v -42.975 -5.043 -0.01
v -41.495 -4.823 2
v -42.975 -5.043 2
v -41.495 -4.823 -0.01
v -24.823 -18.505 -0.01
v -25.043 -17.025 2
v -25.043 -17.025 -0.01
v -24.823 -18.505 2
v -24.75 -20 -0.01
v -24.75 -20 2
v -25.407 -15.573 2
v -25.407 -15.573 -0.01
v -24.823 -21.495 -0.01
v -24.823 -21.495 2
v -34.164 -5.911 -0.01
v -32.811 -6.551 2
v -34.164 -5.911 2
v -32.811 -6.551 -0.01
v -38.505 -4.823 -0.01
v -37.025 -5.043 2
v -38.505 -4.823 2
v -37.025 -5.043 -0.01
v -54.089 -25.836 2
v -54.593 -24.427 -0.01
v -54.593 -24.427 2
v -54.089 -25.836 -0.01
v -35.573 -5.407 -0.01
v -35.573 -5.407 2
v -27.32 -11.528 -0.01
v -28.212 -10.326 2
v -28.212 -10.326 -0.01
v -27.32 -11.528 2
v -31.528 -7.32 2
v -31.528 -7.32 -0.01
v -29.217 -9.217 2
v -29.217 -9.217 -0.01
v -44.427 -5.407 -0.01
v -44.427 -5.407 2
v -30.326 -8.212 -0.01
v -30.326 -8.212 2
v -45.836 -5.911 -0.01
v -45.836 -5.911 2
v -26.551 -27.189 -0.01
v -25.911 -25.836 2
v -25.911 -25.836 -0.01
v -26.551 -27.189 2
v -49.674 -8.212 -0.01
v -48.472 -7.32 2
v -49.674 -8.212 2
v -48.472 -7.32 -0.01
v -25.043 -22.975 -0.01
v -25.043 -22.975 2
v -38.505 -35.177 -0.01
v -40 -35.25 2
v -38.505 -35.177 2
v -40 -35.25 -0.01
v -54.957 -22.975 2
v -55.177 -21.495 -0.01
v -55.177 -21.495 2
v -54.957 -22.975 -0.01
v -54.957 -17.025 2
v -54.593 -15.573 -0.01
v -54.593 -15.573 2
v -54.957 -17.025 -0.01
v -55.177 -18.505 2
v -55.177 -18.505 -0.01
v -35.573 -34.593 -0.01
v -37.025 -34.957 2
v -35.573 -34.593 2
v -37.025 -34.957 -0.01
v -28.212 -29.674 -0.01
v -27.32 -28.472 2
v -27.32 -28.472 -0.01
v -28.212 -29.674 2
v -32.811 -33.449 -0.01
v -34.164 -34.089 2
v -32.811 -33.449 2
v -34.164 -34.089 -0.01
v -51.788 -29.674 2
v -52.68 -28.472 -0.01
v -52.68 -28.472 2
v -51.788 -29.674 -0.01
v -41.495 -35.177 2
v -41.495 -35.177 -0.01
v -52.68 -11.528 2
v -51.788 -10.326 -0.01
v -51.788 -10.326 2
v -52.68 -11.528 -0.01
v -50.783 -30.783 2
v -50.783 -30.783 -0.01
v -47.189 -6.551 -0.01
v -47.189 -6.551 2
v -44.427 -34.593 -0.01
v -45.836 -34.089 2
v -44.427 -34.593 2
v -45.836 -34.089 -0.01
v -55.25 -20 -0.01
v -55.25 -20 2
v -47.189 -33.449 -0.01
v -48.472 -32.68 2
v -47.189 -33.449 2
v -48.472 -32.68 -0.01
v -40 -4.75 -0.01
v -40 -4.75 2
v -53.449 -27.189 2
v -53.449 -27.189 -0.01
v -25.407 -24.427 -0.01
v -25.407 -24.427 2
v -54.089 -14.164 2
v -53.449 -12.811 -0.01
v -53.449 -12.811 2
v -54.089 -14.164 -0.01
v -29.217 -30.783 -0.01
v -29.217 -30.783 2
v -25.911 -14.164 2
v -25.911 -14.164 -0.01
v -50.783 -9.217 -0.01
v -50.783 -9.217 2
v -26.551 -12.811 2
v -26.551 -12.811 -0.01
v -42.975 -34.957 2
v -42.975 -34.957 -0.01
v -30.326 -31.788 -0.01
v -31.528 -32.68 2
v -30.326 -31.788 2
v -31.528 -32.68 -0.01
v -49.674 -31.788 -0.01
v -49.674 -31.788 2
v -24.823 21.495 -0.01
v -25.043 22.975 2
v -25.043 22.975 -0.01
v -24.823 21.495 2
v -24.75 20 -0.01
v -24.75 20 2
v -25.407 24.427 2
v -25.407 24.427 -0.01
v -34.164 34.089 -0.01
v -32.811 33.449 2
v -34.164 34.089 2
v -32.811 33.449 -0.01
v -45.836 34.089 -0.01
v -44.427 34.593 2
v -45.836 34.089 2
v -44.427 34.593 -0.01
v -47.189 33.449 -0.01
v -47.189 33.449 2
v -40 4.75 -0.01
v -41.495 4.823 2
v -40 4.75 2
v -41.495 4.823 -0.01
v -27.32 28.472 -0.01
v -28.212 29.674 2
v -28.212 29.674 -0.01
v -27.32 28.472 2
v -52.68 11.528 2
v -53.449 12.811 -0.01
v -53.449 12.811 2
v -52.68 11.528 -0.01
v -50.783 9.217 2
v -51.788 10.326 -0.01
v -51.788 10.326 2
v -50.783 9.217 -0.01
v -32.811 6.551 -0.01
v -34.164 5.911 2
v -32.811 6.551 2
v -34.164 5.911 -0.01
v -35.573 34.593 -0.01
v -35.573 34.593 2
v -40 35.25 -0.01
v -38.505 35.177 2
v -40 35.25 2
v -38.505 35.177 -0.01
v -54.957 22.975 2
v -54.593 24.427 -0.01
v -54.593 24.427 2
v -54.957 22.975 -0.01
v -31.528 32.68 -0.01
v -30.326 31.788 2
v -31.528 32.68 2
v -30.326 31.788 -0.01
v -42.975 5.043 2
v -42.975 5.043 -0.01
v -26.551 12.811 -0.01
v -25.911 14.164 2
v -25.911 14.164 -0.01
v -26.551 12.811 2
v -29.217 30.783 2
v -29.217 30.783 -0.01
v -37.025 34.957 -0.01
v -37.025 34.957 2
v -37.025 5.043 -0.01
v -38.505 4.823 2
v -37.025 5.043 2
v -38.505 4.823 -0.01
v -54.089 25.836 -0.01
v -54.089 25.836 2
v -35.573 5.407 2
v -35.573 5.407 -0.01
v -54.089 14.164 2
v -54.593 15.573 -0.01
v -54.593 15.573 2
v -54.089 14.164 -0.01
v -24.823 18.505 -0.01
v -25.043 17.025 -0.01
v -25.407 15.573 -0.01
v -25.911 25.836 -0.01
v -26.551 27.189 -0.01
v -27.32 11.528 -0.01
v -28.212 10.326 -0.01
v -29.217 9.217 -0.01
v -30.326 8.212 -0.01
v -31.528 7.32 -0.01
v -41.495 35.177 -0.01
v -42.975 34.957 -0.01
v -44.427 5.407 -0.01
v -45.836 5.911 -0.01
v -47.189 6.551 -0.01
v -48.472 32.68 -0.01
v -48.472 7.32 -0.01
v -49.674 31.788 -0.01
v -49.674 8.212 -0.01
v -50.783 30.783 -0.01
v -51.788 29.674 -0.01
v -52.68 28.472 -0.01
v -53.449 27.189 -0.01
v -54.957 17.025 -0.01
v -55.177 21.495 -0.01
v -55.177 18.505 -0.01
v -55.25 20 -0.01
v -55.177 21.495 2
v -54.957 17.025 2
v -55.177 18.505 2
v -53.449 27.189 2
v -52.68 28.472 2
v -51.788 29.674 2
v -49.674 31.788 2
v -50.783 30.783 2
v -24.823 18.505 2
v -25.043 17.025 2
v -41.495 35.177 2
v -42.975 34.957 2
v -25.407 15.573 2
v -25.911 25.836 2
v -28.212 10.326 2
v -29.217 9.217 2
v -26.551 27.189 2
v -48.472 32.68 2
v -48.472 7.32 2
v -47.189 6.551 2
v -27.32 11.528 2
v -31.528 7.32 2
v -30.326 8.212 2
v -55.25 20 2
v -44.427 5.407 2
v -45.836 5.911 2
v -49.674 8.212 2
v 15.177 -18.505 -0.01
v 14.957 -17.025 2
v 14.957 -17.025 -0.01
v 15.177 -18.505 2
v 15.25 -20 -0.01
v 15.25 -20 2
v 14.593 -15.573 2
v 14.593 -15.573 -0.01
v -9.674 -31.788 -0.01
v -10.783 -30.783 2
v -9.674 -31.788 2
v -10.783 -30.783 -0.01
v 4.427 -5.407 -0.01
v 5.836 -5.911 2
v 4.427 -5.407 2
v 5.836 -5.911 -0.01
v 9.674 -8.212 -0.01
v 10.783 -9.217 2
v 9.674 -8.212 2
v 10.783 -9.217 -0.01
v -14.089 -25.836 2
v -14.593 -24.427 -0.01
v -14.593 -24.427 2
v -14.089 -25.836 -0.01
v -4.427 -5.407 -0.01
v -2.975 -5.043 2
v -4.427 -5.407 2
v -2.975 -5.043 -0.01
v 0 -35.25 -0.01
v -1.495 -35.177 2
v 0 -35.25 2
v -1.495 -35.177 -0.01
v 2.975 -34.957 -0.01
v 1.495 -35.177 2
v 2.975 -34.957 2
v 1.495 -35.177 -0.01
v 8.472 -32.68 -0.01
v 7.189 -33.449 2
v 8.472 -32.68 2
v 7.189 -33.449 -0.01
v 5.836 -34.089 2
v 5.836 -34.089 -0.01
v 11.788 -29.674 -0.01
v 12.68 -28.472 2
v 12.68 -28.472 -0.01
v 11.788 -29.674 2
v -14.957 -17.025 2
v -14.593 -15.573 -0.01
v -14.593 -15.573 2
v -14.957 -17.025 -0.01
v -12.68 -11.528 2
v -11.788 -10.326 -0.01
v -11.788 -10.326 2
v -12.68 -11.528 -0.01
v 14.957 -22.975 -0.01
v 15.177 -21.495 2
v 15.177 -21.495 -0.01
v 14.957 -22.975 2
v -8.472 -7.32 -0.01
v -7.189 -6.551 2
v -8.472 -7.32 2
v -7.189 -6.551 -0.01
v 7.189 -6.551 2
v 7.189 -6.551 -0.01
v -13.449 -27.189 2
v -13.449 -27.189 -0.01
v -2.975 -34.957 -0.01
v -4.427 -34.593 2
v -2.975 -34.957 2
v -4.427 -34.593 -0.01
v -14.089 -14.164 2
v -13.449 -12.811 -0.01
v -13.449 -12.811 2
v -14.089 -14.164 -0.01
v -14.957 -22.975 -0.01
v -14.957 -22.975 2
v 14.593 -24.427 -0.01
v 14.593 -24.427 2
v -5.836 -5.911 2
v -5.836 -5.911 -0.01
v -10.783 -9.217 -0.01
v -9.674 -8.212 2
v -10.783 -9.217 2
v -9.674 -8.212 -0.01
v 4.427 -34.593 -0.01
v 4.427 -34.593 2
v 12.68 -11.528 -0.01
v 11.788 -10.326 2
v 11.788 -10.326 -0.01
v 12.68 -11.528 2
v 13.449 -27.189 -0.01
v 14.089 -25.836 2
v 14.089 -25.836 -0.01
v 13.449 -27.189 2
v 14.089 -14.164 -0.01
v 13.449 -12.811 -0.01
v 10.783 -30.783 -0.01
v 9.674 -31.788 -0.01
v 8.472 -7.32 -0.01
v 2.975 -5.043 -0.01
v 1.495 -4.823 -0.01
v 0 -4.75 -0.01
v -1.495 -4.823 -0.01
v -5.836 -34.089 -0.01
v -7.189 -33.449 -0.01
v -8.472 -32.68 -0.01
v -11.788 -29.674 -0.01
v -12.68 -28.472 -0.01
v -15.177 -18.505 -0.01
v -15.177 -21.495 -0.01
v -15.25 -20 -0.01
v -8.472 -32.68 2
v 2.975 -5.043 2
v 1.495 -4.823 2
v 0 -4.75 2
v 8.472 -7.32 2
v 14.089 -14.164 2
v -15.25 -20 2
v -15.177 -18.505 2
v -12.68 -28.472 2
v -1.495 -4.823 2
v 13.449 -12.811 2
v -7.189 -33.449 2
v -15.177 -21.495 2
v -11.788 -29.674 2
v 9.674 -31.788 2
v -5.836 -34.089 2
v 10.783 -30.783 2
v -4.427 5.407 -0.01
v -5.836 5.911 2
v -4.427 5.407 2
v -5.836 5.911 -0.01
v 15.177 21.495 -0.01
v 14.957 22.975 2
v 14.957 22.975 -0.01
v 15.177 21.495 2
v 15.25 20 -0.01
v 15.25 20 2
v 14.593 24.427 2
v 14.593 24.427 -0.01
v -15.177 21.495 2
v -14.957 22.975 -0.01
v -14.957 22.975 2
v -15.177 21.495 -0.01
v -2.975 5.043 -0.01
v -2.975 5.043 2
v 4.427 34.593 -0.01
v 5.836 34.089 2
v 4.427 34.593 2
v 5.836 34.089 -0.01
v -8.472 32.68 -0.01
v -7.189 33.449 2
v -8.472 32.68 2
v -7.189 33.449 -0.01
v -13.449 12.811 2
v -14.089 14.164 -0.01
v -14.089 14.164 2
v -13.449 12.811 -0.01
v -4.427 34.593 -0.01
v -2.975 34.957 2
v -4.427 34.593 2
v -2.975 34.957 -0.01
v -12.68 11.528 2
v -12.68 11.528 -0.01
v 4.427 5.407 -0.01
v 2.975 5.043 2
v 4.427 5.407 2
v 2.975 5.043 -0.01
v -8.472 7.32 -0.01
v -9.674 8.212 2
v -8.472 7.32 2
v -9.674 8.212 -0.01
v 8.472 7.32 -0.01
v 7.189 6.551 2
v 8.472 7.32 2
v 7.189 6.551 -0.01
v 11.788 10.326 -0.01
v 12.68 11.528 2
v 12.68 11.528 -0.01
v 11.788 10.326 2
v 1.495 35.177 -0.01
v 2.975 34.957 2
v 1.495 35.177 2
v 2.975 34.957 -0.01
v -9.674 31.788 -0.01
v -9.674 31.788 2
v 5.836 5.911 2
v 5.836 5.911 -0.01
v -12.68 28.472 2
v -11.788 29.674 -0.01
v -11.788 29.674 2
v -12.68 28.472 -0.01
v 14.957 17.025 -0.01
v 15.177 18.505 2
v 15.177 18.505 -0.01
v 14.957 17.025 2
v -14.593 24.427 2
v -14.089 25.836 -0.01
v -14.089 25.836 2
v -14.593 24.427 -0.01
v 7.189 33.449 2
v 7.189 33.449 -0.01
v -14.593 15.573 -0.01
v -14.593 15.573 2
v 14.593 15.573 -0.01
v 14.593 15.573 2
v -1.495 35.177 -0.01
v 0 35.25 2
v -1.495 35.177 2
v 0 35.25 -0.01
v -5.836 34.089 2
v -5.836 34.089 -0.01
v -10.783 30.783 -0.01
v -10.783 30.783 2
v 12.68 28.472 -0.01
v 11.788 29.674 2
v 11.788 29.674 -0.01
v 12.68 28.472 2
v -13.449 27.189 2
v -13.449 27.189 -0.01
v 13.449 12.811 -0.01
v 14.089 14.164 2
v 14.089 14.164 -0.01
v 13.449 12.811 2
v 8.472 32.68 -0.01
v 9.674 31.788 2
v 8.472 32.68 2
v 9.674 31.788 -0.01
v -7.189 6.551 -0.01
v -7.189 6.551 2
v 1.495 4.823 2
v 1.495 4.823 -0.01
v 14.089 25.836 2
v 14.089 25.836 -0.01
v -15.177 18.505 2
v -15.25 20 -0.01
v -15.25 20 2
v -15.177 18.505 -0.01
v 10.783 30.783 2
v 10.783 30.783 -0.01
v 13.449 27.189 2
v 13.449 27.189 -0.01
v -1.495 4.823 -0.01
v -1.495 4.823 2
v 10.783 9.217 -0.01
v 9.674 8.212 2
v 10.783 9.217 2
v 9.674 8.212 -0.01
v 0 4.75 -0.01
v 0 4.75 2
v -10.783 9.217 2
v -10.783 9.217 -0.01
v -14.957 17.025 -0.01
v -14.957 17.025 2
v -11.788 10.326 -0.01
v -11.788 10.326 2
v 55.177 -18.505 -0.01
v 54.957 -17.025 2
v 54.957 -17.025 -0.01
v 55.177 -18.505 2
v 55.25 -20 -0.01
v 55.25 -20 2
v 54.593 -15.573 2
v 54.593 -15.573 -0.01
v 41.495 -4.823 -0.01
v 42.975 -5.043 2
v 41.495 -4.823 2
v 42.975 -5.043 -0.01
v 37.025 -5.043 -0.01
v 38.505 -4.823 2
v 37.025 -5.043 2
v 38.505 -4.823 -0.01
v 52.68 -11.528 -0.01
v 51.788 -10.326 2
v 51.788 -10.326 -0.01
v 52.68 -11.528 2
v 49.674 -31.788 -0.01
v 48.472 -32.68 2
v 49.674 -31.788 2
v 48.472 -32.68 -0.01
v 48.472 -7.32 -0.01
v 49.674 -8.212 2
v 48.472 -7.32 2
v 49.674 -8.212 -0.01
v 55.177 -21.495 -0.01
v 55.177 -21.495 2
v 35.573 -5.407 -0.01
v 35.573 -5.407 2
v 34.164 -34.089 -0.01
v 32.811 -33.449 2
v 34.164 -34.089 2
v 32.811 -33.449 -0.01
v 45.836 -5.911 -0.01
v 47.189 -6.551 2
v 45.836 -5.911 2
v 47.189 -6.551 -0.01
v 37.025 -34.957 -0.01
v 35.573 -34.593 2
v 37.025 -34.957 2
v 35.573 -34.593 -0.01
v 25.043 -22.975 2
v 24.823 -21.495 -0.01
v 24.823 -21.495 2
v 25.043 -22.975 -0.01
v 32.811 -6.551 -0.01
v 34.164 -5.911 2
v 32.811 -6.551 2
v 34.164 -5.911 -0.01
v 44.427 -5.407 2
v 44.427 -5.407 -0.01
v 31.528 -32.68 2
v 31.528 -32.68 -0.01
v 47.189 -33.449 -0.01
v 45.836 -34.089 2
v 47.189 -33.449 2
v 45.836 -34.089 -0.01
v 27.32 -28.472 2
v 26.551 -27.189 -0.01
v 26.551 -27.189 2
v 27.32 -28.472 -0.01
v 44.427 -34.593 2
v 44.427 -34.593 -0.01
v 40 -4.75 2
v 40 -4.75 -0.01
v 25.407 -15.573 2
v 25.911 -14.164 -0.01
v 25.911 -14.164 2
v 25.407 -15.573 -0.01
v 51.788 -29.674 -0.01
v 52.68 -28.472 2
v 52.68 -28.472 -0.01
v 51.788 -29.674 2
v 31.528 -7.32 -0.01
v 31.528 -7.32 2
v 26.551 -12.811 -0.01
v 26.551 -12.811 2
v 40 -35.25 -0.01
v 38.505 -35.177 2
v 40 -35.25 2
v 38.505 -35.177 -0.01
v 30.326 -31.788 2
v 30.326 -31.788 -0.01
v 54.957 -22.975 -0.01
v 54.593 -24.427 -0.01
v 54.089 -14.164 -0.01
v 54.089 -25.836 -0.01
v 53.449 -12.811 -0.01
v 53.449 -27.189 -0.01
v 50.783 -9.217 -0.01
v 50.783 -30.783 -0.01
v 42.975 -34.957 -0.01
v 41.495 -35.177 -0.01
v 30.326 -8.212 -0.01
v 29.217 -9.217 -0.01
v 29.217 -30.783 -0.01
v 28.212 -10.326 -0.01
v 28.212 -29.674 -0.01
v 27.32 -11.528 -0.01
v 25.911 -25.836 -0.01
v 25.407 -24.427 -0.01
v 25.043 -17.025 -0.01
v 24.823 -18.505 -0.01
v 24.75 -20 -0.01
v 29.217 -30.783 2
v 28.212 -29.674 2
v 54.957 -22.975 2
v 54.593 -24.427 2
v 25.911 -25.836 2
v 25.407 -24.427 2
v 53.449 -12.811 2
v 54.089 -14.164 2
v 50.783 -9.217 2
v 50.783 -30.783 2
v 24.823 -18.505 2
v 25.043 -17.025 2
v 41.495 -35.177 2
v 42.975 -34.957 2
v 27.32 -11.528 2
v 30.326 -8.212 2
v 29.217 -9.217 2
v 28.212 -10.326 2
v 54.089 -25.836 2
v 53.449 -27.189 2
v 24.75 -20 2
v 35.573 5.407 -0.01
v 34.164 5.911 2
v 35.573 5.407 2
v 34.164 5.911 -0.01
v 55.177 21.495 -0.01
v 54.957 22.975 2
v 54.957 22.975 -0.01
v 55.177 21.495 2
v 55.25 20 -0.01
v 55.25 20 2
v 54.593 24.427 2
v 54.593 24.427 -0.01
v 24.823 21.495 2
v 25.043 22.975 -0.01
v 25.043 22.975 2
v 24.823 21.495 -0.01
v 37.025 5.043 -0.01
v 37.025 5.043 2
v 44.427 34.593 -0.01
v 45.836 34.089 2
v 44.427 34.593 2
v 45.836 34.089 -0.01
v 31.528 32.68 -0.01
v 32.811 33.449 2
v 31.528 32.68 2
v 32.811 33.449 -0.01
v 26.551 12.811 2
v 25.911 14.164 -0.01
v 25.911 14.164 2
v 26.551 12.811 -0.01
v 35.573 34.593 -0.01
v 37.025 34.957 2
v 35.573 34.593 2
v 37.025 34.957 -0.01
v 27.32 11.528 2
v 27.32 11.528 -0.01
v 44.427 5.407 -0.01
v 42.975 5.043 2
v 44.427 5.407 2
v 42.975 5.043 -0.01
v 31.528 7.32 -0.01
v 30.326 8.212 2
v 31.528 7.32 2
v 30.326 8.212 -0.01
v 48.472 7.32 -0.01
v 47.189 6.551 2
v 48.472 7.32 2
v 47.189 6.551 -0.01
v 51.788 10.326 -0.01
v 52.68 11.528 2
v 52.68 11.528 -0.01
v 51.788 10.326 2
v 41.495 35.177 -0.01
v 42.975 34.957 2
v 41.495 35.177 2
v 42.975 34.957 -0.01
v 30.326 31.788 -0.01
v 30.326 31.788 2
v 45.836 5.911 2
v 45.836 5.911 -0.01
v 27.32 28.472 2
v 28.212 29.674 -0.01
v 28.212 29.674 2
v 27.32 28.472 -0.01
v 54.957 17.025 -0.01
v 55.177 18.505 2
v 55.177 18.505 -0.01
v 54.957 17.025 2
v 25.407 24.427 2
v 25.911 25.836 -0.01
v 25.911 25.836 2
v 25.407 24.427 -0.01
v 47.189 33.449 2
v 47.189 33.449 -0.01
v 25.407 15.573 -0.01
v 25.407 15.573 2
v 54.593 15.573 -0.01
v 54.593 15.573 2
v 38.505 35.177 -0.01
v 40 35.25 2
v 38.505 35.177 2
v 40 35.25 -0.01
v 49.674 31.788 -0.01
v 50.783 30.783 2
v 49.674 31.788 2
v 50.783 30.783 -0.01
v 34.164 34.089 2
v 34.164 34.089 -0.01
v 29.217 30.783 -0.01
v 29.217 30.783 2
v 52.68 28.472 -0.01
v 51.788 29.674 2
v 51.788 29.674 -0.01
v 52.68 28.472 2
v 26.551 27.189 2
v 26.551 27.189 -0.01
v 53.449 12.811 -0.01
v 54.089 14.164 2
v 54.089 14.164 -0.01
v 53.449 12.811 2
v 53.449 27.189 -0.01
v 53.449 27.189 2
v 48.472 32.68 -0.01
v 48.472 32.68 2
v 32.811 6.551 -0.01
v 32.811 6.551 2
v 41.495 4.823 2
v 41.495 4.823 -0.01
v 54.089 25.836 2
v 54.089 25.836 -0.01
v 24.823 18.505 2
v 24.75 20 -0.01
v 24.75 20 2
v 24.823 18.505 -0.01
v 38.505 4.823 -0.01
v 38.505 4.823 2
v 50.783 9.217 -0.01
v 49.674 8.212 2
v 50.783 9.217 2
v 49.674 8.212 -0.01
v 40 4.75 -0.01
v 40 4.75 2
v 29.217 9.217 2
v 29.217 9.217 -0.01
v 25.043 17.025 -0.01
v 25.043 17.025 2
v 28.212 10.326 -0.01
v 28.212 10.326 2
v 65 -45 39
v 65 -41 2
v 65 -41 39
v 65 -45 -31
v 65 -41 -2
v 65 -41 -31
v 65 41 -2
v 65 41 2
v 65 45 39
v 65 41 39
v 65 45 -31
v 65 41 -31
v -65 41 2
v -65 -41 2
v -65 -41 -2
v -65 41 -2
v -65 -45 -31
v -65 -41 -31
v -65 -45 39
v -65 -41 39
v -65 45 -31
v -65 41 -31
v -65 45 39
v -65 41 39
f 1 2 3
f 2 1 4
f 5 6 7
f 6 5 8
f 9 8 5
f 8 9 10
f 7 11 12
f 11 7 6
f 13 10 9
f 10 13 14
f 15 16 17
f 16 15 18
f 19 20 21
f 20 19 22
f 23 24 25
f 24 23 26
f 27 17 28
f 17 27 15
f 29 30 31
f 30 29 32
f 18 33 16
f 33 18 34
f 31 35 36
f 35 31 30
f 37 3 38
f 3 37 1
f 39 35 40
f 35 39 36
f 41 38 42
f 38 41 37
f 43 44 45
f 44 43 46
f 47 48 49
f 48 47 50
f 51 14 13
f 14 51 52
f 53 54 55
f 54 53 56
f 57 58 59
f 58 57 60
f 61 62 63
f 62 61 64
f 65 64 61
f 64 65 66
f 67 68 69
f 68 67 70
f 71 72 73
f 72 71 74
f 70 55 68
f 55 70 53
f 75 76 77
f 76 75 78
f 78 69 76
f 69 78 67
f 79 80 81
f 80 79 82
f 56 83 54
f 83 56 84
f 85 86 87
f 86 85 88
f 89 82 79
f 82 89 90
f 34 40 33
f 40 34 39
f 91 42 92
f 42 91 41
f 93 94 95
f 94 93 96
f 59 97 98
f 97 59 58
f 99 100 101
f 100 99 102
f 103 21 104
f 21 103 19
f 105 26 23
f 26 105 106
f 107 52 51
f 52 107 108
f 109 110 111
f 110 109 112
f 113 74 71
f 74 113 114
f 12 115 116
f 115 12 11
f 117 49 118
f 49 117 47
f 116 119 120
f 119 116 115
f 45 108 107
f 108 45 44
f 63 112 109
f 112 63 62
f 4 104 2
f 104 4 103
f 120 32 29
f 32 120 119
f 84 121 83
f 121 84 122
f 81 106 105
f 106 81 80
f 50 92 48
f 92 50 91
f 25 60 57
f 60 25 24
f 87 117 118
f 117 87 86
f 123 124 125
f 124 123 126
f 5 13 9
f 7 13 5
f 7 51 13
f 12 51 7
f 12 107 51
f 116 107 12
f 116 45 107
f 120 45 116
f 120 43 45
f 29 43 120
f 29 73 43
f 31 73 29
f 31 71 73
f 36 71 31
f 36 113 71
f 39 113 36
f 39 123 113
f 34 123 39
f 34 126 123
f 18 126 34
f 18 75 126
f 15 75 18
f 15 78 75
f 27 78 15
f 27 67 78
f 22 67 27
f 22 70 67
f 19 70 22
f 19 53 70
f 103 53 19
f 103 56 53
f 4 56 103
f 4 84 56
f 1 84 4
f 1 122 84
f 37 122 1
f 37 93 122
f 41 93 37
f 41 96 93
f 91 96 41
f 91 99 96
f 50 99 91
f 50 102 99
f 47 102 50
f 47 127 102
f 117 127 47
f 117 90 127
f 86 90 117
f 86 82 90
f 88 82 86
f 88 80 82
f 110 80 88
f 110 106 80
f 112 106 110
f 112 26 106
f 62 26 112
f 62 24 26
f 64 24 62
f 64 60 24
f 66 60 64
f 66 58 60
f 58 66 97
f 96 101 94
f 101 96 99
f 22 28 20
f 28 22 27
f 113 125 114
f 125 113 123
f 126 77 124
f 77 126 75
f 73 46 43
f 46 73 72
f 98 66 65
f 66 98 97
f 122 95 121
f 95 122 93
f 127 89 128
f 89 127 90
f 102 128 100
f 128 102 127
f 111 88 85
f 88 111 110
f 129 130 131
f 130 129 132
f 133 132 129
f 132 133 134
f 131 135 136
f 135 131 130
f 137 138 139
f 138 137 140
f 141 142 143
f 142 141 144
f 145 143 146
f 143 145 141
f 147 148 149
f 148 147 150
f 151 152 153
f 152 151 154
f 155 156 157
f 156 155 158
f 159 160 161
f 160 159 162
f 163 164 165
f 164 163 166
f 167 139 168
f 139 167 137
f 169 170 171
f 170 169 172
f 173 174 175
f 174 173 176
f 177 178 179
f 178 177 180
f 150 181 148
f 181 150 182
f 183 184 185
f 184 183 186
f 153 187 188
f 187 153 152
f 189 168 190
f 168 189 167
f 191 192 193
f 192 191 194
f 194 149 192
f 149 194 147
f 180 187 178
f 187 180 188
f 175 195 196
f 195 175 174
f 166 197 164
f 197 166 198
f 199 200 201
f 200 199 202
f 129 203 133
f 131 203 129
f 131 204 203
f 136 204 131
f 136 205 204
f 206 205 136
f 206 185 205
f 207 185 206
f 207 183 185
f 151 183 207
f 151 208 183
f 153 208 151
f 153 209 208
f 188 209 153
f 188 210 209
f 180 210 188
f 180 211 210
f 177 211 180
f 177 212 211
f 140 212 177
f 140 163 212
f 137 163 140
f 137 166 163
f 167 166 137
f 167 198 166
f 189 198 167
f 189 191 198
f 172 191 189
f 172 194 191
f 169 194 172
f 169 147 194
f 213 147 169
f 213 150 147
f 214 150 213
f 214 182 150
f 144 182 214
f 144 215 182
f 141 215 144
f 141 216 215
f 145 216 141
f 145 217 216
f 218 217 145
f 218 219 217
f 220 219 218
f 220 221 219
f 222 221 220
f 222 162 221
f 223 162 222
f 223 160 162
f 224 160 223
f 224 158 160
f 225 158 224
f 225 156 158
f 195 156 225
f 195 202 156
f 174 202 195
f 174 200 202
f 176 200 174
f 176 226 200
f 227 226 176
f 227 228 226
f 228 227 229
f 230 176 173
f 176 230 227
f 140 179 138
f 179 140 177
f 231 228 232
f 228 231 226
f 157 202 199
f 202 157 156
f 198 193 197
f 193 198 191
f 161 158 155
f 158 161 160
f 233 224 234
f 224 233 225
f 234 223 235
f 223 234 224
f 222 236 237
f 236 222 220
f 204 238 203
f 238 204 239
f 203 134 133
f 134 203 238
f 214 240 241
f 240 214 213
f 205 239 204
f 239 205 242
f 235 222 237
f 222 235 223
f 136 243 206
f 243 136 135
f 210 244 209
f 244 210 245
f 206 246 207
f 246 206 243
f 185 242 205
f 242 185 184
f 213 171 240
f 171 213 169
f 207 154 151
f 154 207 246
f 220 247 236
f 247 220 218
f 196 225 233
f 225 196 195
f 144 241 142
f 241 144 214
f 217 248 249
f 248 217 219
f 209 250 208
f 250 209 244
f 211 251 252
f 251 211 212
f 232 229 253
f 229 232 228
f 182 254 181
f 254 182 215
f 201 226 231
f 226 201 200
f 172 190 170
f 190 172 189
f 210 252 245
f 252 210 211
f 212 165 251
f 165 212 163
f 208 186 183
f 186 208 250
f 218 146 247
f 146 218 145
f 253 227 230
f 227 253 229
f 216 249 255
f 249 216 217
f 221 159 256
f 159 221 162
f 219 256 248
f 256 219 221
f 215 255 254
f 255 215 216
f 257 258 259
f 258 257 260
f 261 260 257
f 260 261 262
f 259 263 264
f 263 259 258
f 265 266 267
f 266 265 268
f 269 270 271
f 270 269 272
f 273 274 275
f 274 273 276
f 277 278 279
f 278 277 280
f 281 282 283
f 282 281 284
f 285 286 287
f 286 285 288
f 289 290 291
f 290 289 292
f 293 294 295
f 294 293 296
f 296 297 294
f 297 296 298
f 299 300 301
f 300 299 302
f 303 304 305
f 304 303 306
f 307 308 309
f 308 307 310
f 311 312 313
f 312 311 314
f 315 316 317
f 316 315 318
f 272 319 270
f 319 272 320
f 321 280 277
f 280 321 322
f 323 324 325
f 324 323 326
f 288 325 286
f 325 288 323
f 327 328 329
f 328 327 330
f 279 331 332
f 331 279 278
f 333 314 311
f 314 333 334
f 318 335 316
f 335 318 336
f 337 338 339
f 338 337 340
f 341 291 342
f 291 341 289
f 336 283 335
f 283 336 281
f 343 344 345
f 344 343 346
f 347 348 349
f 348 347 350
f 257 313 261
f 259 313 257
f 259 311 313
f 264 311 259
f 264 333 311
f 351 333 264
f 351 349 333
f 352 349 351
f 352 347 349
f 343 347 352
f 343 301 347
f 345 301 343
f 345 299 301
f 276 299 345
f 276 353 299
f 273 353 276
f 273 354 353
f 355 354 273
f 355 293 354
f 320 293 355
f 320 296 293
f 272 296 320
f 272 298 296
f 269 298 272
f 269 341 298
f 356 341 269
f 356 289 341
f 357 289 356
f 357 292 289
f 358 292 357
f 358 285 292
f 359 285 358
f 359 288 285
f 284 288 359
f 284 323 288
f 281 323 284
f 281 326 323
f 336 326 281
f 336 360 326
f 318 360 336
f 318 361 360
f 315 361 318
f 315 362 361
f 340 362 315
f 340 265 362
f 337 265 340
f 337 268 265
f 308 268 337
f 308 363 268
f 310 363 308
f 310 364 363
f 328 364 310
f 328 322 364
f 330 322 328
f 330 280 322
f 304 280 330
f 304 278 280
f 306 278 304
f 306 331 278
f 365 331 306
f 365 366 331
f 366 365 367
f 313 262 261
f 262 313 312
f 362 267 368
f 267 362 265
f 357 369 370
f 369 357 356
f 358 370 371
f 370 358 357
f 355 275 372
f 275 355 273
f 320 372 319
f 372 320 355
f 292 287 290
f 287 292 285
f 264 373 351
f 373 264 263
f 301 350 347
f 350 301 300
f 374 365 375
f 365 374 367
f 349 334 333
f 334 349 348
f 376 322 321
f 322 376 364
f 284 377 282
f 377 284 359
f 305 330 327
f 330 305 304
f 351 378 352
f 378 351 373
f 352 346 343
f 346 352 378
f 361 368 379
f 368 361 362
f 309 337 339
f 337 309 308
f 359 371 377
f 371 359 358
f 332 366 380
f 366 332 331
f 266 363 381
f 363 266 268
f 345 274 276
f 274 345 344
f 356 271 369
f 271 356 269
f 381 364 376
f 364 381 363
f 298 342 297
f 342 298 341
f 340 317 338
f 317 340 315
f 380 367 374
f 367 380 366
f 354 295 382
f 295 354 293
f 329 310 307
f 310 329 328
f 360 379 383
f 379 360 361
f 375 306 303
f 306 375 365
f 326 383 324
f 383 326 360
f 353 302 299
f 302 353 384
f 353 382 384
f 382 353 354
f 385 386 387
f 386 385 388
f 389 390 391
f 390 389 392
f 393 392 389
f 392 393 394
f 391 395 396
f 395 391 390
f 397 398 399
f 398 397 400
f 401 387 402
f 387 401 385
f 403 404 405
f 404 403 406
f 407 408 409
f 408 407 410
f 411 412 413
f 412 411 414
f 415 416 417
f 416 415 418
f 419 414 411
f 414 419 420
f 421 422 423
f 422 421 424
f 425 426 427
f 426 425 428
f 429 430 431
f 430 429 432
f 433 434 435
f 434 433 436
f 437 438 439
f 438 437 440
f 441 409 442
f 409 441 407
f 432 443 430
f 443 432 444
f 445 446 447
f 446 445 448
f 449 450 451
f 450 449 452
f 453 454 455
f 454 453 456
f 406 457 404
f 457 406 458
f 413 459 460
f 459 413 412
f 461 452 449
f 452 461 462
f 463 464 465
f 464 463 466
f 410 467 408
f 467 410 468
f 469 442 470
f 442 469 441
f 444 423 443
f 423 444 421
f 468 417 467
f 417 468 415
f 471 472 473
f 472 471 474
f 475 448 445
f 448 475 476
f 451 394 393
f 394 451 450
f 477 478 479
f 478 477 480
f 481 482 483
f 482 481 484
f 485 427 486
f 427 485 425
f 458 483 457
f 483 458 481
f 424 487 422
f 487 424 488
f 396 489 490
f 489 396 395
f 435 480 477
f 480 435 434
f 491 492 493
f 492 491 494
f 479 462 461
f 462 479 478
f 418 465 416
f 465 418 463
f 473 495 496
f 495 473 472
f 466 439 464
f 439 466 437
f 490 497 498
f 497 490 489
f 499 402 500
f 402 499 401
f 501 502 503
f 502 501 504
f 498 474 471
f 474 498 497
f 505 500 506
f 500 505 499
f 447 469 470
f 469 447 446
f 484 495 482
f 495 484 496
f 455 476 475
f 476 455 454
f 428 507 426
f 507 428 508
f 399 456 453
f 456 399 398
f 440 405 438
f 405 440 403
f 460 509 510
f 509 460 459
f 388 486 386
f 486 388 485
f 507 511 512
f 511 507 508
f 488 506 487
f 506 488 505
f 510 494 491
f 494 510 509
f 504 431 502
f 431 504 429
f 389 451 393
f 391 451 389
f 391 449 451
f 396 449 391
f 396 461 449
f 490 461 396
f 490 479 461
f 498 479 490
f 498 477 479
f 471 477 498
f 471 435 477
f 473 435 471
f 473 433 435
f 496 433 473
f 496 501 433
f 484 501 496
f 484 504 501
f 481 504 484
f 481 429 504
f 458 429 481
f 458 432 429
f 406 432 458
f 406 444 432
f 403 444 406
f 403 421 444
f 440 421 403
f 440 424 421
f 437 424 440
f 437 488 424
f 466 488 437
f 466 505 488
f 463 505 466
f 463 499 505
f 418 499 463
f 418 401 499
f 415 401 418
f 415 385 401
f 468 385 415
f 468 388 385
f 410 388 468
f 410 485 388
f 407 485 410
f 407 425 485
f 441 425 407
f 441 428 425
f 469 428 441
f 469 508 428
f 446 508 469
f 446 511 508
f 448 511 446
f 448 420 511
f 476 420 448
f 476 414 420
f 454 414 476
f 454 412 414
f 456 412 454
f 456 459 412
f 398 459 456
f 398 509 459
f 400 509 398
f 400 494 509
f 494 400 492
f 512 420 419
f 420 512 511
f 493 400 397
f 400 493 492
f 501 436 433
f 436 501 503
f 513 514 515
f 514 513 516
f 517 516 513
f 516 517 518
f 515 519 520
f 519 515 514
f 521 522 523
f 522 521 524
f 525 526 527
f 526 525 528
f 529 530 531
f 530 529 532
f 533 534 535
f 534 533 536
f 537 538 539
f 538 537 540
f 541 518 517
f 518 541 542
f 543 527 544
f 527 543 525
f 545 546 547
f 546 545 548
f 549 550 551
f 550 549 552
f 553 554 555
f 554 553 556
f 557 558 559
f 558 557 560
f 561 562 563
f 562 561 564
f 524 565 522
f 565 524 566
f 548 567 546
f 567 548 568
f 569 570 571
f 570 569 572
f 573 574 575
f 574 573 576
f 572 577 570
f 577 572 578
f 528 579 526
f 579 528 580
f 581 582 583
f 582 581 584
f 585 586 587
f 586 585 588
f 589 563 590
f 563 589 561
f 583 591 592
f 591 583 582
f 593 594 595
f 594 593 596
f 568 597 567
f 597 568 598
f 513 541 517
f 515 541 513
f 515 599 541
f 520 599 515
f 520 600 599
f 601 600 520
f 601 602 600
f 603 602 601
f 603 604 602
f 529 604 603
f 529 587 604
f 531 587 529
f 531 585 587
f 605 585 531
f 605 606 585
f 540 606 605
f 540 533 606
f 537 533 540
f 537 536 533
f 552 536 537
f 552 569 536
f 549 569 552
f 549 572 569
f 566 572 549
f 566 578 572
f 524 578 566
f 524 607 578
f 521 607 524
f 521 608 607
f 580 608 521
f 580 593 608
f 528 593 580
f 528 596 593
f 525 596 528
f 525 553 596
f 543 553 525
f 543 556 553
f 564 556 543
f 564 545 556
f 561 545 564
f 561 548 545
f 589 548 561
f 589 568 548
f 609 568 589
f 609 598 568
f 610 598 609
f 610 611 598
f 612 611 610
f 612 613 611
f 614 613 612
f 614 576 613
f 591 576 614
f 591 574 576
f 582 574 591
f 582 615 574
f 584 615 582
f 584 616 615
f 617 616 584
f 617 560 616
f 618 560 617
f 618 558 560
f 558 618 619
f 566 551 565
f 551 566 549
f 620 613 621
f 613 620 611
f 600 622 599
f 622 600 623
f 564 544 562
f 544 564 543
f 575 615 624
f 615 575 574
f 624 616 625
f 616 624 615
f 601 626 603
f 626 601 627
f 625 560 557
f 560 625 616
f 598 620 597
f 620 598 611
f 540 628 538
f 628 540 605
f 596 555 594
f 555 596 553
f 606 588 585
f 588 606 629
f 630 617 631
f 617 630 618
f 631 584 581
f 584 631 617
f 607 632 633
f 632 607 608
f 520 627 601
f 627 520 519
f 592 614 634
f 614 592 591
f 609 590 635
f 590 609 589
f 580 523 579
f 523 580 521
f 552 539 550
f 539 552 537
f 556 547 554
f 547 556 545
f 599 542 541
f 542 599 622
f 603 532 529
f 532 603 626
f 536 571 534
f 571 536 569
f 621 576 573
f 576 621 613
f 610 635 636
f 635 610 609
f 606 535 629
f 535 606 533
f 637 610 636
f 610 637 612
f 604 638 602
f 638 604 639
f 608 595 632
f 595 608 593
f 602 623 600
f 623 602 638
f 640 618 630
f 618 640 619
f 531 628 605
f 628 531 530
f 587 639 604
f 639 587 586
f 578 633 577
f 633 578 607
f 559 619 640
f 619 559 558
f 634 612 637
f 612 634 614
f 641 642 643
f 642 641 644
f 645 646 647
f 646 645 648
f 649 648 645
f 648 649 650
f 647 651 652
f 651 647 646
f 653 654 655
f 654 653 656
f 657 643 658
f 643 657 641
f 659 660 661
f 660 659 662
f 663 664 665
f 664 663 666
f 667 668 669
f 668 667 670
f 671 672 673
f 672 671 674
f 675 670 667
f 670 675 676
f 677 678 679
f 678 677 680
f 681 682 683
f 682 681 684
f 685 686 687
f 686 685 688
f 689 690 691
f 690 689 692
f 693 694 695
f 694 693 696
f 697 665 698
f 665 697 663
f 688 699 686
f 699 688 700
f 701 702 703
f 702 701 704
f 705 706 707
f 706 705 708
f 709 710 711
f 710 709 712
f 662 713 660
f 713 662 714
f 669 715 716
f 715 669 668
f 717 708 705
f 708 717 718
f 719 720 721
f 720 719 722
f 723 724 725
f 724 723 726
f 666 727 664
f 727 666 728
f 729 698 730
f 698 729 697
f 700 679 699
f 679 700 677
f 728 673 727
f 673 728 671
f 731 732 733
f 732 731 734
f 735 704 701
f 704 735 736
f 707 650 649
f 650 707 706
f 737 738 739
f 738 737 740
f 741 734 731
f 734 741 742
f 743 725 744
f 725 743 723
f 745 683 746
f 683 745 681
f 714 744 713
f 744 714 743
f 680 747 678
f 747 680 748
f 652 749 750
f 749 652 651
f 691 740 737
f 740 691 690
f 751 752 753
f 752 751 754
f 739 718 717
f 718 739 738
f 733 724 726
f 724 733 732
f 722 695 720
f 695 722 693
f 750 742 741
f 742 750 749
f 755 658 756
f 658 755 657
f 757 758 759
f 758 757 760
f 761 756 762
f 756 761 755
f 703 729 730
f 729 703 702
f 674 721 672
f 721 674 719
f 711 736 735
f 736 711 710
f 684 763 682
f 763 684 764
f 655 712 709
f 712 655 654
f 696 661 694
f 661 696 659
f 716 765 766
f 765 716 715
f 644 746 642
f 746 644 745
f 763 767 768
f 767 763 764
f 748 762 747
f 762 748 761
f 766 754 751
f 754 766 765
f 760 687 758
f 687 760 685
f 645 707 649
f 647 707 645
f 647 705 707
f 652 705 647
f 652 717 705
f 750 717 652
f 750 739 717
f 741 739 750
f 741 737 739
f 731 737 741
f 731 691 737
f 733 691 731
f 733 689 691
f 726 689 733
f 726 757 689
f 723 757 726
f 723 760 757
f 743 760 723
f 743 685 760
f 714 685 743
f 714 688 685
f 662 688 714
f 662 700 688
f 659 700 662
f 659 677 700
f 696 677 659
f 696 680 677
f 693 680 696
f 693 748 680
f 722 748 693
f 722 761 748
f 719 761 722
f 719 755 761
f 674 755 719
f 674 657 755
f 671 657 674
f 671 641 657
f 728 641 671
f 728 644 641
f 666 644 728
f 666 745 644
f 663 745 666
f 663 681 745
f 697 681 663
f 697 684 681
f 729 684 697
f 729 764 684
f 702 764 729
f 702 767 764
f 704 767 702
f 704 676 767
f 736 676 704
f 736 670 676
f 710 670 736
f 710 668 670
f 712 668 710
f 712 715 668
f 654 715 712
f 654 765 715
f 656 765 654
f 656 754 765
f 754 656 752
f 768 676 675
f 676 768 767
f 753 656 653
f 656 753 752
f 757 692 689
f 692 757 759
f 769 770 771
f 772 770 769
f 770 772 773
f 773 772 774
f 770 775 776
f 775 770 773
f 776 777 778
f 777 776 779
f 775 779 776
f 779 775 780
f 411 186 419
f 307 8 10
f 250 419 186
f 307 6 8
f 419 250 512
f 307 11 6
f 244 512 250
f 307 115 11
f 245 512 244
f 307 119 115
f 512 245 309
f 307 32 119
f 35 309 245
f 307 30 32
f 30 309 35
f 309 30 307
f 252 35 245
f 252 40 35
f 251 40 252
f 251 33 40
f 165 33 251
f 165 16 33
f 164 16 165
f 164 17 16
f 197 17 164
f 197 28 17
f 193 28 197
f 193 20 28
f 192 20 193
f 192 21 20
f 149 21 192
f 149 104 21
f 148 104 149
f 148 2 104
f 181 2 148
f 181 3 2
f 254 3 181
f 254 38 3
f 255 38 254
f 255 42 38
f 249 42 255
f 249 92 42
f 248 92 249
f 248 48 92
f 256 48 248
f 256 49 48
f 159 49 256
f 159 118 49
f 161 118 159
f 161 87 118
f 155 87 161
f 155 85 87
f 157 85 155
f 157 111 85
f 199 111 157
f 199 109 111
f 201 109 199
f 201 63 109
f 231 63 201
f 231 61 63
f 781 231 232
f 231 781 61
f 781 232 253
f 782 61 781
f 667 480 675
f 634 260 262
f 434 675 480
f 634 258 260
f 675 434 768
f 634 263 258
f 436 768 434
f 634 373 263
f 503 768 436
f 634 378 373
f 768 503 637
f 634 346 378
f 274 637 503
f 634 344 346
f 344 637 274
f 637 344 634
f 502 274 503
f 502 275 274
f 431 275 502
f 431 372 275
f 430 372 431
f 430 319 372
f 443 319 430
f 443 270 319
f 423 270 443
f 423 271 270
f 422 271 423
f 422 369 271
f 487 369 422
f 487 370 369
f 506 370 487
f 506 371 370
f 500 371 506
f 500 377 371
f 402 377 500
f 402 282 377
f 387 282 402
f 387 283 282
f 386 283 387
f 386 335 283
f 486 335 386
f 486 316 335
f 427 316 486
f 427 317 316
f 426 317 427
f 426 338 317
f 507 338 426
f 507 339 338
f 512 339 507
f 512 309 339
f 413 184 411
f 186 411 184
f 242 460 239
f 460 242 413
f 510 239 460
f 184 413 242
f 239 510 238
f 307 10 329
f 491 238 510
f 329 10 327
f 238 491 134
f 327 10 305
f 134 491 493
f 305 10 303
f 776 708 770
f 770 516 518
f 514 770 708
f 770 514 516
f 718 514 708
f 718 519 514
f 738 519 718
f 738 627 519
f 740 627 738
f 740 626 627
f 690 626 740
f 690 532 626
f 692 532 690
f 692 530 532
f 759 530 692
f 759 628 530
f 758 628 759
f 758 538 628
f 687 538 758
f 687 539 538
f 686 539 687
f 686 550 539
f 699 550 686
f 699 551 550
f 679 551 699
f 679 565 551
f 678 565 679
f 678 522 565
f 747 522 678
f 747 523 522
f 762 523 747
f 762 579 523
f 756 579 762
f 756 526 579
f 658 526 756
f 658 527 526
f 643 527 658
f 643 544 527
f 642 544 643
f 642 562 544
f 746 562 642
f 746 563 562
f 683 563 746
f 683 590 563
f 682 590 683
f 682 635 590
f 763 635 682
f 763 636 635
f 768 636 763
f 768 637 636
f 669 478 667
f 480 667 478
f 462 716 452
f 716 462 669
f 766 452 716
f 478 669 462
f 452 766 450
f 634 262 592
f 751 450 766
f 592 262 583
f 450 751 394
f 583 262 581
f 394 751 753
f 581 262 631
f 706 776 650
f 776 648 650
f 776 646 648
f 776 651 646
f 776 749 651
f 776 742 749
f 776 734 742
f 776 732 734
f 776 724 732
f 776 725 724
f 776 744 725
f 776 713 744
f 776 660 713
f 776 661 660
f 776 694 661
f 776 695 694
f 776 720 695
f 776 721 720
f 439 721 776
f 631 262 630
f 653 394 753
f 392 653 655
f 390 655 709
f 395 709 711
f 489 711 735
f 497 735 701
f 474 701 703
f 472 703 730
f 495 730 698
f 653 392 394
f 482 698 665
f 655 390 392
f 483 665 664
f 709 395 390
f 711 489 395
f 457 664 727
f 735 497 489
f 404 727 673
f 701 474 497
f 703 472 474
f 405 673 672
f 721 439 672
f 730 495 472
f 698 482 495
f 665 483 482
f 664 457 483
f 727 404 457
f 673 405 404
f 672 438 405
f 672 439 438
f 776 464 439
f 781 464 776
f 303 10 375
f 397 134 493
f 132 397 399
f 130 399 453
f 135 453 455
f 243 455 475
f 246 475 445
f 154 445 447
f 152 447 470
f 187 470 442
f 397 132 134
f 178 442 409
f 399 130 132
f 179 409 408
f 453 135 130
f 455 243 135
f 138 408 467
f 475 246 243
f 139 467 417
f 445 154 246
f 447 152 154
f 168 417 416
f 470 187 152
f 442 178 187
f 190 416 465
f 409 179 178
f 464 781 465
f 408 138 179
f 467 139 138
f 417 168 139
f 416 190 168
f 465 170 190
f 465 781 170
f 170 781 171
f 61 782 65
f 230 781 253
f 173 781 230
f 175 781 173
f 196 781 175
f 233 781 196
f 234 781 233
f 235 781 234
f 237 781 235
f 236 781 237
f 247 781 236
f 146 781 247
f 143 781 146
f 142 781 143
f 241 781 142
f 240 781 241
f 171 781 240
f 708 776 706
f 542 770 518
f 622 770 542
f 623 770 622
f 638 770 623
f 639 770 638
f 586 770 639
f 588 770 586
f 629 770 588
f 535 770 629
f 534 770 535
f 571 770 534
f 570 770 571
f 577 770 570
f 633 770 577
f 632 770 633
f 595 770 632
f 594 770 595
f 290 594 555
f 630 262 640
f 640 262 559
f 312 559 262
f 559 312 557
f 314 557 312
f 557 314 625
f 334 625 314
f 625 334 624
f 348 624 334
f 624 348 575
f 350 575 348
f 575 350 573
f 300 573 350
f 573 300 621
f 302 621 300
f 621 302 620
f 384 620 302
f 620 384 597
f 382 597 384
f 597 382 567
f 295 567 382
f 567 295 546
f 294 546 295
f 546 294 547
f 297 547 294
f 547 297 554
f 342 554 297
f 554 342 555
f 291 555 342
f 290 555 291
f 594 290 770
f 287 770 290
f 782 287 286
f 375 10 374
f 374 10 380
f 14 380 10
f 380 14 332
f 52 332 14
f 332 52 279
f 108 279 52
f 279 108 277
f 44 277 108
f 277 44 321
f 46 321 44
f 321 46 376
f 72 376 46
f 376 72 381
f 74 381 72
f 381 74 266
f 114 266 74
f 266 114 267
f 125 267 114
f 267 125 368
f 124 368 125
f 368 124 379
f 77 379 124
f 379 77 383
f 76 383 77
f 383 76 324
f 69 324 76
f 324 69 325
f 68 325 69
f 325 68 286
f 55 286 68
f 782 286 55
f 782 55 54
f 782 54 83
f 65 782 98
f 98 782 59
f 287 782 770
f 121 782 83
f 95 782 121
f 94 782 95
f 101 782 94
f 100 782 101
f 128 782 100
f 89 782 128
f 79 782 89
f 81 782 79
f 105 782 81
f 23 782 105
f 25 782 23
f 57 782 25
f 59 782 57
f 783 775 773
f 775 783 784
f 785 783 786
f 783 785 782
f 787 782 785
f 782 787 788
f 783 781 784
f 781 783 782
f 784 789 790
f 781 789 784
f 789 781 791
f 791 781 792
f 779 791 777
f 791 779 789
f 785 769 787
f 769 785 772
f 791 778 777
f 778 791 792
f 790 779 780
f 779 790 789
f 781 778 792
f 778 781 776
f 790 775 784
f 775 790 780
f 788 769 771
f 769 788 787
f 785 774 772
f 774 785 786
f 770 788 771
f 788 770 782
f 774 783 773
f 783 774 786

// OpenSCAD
// Tube rack for 6x 50 mL conical tubes
// Print orientation: plate on bed, walls rise up. Flipped after print.

// Plate dimensions
plate_x = 130;
plate_y = 90;
plate_z = 4;

// Hole parameters
hole_dia = 30.5;
hole_radius = hole_dia / 2;

// Hole grid: 2 rows (Y), 3 columns (X)
rows = 2;
cols = 3;
pitch_x = 40;
pitch_y = 40;

// Wall parameters
wall_length_x = 130;
wall_thickness_y = 4;
wall_height = 70;

// Global fineness for round holes
$fn = 64;

// Calculate grid offsets to centre the holes on the plate
offset_x = (cols - 1) * pitch_x / 2;
offset_y = (rows - 1) * pitch_y / 2;

module rack() {
    // Plate - centred on origin in X and Y
    difference() {
        cube([plate_x, plate_y, plate_z], center = true);
        
        // Six through-holes
        for (i = [0 : cols - 1]) {
            for (j = [0 : rows - 1]) {
                translate([
                    -offset_x + i * pitch_x,
                    -offset_y + j * pitch_y,
                    -0.01
                ]) {
                    cylinder(d = hole_dia, h = plate_z + 0.02, center = false);
                }
            }
        }
    }
    
    // Two long walls (along X, at Y = ±plate_y/2)
    // Wall is flush with plate edge, so wall center is at plate_y/2 - wall_thickness_y/2
    translate([0, plate_y/2 - wall_thickness_y/2, plate_z]) {
        cube([wall_length_x, wall_thickness_y, wall_height], center = true);
    }
    
    translate([0, -(plate_y/2 - wall_thickness_y/2), plate_z]) {
        cube([wall_length_x, wall_thickness_y, wall_height], center = true);
    }
}

rack();
